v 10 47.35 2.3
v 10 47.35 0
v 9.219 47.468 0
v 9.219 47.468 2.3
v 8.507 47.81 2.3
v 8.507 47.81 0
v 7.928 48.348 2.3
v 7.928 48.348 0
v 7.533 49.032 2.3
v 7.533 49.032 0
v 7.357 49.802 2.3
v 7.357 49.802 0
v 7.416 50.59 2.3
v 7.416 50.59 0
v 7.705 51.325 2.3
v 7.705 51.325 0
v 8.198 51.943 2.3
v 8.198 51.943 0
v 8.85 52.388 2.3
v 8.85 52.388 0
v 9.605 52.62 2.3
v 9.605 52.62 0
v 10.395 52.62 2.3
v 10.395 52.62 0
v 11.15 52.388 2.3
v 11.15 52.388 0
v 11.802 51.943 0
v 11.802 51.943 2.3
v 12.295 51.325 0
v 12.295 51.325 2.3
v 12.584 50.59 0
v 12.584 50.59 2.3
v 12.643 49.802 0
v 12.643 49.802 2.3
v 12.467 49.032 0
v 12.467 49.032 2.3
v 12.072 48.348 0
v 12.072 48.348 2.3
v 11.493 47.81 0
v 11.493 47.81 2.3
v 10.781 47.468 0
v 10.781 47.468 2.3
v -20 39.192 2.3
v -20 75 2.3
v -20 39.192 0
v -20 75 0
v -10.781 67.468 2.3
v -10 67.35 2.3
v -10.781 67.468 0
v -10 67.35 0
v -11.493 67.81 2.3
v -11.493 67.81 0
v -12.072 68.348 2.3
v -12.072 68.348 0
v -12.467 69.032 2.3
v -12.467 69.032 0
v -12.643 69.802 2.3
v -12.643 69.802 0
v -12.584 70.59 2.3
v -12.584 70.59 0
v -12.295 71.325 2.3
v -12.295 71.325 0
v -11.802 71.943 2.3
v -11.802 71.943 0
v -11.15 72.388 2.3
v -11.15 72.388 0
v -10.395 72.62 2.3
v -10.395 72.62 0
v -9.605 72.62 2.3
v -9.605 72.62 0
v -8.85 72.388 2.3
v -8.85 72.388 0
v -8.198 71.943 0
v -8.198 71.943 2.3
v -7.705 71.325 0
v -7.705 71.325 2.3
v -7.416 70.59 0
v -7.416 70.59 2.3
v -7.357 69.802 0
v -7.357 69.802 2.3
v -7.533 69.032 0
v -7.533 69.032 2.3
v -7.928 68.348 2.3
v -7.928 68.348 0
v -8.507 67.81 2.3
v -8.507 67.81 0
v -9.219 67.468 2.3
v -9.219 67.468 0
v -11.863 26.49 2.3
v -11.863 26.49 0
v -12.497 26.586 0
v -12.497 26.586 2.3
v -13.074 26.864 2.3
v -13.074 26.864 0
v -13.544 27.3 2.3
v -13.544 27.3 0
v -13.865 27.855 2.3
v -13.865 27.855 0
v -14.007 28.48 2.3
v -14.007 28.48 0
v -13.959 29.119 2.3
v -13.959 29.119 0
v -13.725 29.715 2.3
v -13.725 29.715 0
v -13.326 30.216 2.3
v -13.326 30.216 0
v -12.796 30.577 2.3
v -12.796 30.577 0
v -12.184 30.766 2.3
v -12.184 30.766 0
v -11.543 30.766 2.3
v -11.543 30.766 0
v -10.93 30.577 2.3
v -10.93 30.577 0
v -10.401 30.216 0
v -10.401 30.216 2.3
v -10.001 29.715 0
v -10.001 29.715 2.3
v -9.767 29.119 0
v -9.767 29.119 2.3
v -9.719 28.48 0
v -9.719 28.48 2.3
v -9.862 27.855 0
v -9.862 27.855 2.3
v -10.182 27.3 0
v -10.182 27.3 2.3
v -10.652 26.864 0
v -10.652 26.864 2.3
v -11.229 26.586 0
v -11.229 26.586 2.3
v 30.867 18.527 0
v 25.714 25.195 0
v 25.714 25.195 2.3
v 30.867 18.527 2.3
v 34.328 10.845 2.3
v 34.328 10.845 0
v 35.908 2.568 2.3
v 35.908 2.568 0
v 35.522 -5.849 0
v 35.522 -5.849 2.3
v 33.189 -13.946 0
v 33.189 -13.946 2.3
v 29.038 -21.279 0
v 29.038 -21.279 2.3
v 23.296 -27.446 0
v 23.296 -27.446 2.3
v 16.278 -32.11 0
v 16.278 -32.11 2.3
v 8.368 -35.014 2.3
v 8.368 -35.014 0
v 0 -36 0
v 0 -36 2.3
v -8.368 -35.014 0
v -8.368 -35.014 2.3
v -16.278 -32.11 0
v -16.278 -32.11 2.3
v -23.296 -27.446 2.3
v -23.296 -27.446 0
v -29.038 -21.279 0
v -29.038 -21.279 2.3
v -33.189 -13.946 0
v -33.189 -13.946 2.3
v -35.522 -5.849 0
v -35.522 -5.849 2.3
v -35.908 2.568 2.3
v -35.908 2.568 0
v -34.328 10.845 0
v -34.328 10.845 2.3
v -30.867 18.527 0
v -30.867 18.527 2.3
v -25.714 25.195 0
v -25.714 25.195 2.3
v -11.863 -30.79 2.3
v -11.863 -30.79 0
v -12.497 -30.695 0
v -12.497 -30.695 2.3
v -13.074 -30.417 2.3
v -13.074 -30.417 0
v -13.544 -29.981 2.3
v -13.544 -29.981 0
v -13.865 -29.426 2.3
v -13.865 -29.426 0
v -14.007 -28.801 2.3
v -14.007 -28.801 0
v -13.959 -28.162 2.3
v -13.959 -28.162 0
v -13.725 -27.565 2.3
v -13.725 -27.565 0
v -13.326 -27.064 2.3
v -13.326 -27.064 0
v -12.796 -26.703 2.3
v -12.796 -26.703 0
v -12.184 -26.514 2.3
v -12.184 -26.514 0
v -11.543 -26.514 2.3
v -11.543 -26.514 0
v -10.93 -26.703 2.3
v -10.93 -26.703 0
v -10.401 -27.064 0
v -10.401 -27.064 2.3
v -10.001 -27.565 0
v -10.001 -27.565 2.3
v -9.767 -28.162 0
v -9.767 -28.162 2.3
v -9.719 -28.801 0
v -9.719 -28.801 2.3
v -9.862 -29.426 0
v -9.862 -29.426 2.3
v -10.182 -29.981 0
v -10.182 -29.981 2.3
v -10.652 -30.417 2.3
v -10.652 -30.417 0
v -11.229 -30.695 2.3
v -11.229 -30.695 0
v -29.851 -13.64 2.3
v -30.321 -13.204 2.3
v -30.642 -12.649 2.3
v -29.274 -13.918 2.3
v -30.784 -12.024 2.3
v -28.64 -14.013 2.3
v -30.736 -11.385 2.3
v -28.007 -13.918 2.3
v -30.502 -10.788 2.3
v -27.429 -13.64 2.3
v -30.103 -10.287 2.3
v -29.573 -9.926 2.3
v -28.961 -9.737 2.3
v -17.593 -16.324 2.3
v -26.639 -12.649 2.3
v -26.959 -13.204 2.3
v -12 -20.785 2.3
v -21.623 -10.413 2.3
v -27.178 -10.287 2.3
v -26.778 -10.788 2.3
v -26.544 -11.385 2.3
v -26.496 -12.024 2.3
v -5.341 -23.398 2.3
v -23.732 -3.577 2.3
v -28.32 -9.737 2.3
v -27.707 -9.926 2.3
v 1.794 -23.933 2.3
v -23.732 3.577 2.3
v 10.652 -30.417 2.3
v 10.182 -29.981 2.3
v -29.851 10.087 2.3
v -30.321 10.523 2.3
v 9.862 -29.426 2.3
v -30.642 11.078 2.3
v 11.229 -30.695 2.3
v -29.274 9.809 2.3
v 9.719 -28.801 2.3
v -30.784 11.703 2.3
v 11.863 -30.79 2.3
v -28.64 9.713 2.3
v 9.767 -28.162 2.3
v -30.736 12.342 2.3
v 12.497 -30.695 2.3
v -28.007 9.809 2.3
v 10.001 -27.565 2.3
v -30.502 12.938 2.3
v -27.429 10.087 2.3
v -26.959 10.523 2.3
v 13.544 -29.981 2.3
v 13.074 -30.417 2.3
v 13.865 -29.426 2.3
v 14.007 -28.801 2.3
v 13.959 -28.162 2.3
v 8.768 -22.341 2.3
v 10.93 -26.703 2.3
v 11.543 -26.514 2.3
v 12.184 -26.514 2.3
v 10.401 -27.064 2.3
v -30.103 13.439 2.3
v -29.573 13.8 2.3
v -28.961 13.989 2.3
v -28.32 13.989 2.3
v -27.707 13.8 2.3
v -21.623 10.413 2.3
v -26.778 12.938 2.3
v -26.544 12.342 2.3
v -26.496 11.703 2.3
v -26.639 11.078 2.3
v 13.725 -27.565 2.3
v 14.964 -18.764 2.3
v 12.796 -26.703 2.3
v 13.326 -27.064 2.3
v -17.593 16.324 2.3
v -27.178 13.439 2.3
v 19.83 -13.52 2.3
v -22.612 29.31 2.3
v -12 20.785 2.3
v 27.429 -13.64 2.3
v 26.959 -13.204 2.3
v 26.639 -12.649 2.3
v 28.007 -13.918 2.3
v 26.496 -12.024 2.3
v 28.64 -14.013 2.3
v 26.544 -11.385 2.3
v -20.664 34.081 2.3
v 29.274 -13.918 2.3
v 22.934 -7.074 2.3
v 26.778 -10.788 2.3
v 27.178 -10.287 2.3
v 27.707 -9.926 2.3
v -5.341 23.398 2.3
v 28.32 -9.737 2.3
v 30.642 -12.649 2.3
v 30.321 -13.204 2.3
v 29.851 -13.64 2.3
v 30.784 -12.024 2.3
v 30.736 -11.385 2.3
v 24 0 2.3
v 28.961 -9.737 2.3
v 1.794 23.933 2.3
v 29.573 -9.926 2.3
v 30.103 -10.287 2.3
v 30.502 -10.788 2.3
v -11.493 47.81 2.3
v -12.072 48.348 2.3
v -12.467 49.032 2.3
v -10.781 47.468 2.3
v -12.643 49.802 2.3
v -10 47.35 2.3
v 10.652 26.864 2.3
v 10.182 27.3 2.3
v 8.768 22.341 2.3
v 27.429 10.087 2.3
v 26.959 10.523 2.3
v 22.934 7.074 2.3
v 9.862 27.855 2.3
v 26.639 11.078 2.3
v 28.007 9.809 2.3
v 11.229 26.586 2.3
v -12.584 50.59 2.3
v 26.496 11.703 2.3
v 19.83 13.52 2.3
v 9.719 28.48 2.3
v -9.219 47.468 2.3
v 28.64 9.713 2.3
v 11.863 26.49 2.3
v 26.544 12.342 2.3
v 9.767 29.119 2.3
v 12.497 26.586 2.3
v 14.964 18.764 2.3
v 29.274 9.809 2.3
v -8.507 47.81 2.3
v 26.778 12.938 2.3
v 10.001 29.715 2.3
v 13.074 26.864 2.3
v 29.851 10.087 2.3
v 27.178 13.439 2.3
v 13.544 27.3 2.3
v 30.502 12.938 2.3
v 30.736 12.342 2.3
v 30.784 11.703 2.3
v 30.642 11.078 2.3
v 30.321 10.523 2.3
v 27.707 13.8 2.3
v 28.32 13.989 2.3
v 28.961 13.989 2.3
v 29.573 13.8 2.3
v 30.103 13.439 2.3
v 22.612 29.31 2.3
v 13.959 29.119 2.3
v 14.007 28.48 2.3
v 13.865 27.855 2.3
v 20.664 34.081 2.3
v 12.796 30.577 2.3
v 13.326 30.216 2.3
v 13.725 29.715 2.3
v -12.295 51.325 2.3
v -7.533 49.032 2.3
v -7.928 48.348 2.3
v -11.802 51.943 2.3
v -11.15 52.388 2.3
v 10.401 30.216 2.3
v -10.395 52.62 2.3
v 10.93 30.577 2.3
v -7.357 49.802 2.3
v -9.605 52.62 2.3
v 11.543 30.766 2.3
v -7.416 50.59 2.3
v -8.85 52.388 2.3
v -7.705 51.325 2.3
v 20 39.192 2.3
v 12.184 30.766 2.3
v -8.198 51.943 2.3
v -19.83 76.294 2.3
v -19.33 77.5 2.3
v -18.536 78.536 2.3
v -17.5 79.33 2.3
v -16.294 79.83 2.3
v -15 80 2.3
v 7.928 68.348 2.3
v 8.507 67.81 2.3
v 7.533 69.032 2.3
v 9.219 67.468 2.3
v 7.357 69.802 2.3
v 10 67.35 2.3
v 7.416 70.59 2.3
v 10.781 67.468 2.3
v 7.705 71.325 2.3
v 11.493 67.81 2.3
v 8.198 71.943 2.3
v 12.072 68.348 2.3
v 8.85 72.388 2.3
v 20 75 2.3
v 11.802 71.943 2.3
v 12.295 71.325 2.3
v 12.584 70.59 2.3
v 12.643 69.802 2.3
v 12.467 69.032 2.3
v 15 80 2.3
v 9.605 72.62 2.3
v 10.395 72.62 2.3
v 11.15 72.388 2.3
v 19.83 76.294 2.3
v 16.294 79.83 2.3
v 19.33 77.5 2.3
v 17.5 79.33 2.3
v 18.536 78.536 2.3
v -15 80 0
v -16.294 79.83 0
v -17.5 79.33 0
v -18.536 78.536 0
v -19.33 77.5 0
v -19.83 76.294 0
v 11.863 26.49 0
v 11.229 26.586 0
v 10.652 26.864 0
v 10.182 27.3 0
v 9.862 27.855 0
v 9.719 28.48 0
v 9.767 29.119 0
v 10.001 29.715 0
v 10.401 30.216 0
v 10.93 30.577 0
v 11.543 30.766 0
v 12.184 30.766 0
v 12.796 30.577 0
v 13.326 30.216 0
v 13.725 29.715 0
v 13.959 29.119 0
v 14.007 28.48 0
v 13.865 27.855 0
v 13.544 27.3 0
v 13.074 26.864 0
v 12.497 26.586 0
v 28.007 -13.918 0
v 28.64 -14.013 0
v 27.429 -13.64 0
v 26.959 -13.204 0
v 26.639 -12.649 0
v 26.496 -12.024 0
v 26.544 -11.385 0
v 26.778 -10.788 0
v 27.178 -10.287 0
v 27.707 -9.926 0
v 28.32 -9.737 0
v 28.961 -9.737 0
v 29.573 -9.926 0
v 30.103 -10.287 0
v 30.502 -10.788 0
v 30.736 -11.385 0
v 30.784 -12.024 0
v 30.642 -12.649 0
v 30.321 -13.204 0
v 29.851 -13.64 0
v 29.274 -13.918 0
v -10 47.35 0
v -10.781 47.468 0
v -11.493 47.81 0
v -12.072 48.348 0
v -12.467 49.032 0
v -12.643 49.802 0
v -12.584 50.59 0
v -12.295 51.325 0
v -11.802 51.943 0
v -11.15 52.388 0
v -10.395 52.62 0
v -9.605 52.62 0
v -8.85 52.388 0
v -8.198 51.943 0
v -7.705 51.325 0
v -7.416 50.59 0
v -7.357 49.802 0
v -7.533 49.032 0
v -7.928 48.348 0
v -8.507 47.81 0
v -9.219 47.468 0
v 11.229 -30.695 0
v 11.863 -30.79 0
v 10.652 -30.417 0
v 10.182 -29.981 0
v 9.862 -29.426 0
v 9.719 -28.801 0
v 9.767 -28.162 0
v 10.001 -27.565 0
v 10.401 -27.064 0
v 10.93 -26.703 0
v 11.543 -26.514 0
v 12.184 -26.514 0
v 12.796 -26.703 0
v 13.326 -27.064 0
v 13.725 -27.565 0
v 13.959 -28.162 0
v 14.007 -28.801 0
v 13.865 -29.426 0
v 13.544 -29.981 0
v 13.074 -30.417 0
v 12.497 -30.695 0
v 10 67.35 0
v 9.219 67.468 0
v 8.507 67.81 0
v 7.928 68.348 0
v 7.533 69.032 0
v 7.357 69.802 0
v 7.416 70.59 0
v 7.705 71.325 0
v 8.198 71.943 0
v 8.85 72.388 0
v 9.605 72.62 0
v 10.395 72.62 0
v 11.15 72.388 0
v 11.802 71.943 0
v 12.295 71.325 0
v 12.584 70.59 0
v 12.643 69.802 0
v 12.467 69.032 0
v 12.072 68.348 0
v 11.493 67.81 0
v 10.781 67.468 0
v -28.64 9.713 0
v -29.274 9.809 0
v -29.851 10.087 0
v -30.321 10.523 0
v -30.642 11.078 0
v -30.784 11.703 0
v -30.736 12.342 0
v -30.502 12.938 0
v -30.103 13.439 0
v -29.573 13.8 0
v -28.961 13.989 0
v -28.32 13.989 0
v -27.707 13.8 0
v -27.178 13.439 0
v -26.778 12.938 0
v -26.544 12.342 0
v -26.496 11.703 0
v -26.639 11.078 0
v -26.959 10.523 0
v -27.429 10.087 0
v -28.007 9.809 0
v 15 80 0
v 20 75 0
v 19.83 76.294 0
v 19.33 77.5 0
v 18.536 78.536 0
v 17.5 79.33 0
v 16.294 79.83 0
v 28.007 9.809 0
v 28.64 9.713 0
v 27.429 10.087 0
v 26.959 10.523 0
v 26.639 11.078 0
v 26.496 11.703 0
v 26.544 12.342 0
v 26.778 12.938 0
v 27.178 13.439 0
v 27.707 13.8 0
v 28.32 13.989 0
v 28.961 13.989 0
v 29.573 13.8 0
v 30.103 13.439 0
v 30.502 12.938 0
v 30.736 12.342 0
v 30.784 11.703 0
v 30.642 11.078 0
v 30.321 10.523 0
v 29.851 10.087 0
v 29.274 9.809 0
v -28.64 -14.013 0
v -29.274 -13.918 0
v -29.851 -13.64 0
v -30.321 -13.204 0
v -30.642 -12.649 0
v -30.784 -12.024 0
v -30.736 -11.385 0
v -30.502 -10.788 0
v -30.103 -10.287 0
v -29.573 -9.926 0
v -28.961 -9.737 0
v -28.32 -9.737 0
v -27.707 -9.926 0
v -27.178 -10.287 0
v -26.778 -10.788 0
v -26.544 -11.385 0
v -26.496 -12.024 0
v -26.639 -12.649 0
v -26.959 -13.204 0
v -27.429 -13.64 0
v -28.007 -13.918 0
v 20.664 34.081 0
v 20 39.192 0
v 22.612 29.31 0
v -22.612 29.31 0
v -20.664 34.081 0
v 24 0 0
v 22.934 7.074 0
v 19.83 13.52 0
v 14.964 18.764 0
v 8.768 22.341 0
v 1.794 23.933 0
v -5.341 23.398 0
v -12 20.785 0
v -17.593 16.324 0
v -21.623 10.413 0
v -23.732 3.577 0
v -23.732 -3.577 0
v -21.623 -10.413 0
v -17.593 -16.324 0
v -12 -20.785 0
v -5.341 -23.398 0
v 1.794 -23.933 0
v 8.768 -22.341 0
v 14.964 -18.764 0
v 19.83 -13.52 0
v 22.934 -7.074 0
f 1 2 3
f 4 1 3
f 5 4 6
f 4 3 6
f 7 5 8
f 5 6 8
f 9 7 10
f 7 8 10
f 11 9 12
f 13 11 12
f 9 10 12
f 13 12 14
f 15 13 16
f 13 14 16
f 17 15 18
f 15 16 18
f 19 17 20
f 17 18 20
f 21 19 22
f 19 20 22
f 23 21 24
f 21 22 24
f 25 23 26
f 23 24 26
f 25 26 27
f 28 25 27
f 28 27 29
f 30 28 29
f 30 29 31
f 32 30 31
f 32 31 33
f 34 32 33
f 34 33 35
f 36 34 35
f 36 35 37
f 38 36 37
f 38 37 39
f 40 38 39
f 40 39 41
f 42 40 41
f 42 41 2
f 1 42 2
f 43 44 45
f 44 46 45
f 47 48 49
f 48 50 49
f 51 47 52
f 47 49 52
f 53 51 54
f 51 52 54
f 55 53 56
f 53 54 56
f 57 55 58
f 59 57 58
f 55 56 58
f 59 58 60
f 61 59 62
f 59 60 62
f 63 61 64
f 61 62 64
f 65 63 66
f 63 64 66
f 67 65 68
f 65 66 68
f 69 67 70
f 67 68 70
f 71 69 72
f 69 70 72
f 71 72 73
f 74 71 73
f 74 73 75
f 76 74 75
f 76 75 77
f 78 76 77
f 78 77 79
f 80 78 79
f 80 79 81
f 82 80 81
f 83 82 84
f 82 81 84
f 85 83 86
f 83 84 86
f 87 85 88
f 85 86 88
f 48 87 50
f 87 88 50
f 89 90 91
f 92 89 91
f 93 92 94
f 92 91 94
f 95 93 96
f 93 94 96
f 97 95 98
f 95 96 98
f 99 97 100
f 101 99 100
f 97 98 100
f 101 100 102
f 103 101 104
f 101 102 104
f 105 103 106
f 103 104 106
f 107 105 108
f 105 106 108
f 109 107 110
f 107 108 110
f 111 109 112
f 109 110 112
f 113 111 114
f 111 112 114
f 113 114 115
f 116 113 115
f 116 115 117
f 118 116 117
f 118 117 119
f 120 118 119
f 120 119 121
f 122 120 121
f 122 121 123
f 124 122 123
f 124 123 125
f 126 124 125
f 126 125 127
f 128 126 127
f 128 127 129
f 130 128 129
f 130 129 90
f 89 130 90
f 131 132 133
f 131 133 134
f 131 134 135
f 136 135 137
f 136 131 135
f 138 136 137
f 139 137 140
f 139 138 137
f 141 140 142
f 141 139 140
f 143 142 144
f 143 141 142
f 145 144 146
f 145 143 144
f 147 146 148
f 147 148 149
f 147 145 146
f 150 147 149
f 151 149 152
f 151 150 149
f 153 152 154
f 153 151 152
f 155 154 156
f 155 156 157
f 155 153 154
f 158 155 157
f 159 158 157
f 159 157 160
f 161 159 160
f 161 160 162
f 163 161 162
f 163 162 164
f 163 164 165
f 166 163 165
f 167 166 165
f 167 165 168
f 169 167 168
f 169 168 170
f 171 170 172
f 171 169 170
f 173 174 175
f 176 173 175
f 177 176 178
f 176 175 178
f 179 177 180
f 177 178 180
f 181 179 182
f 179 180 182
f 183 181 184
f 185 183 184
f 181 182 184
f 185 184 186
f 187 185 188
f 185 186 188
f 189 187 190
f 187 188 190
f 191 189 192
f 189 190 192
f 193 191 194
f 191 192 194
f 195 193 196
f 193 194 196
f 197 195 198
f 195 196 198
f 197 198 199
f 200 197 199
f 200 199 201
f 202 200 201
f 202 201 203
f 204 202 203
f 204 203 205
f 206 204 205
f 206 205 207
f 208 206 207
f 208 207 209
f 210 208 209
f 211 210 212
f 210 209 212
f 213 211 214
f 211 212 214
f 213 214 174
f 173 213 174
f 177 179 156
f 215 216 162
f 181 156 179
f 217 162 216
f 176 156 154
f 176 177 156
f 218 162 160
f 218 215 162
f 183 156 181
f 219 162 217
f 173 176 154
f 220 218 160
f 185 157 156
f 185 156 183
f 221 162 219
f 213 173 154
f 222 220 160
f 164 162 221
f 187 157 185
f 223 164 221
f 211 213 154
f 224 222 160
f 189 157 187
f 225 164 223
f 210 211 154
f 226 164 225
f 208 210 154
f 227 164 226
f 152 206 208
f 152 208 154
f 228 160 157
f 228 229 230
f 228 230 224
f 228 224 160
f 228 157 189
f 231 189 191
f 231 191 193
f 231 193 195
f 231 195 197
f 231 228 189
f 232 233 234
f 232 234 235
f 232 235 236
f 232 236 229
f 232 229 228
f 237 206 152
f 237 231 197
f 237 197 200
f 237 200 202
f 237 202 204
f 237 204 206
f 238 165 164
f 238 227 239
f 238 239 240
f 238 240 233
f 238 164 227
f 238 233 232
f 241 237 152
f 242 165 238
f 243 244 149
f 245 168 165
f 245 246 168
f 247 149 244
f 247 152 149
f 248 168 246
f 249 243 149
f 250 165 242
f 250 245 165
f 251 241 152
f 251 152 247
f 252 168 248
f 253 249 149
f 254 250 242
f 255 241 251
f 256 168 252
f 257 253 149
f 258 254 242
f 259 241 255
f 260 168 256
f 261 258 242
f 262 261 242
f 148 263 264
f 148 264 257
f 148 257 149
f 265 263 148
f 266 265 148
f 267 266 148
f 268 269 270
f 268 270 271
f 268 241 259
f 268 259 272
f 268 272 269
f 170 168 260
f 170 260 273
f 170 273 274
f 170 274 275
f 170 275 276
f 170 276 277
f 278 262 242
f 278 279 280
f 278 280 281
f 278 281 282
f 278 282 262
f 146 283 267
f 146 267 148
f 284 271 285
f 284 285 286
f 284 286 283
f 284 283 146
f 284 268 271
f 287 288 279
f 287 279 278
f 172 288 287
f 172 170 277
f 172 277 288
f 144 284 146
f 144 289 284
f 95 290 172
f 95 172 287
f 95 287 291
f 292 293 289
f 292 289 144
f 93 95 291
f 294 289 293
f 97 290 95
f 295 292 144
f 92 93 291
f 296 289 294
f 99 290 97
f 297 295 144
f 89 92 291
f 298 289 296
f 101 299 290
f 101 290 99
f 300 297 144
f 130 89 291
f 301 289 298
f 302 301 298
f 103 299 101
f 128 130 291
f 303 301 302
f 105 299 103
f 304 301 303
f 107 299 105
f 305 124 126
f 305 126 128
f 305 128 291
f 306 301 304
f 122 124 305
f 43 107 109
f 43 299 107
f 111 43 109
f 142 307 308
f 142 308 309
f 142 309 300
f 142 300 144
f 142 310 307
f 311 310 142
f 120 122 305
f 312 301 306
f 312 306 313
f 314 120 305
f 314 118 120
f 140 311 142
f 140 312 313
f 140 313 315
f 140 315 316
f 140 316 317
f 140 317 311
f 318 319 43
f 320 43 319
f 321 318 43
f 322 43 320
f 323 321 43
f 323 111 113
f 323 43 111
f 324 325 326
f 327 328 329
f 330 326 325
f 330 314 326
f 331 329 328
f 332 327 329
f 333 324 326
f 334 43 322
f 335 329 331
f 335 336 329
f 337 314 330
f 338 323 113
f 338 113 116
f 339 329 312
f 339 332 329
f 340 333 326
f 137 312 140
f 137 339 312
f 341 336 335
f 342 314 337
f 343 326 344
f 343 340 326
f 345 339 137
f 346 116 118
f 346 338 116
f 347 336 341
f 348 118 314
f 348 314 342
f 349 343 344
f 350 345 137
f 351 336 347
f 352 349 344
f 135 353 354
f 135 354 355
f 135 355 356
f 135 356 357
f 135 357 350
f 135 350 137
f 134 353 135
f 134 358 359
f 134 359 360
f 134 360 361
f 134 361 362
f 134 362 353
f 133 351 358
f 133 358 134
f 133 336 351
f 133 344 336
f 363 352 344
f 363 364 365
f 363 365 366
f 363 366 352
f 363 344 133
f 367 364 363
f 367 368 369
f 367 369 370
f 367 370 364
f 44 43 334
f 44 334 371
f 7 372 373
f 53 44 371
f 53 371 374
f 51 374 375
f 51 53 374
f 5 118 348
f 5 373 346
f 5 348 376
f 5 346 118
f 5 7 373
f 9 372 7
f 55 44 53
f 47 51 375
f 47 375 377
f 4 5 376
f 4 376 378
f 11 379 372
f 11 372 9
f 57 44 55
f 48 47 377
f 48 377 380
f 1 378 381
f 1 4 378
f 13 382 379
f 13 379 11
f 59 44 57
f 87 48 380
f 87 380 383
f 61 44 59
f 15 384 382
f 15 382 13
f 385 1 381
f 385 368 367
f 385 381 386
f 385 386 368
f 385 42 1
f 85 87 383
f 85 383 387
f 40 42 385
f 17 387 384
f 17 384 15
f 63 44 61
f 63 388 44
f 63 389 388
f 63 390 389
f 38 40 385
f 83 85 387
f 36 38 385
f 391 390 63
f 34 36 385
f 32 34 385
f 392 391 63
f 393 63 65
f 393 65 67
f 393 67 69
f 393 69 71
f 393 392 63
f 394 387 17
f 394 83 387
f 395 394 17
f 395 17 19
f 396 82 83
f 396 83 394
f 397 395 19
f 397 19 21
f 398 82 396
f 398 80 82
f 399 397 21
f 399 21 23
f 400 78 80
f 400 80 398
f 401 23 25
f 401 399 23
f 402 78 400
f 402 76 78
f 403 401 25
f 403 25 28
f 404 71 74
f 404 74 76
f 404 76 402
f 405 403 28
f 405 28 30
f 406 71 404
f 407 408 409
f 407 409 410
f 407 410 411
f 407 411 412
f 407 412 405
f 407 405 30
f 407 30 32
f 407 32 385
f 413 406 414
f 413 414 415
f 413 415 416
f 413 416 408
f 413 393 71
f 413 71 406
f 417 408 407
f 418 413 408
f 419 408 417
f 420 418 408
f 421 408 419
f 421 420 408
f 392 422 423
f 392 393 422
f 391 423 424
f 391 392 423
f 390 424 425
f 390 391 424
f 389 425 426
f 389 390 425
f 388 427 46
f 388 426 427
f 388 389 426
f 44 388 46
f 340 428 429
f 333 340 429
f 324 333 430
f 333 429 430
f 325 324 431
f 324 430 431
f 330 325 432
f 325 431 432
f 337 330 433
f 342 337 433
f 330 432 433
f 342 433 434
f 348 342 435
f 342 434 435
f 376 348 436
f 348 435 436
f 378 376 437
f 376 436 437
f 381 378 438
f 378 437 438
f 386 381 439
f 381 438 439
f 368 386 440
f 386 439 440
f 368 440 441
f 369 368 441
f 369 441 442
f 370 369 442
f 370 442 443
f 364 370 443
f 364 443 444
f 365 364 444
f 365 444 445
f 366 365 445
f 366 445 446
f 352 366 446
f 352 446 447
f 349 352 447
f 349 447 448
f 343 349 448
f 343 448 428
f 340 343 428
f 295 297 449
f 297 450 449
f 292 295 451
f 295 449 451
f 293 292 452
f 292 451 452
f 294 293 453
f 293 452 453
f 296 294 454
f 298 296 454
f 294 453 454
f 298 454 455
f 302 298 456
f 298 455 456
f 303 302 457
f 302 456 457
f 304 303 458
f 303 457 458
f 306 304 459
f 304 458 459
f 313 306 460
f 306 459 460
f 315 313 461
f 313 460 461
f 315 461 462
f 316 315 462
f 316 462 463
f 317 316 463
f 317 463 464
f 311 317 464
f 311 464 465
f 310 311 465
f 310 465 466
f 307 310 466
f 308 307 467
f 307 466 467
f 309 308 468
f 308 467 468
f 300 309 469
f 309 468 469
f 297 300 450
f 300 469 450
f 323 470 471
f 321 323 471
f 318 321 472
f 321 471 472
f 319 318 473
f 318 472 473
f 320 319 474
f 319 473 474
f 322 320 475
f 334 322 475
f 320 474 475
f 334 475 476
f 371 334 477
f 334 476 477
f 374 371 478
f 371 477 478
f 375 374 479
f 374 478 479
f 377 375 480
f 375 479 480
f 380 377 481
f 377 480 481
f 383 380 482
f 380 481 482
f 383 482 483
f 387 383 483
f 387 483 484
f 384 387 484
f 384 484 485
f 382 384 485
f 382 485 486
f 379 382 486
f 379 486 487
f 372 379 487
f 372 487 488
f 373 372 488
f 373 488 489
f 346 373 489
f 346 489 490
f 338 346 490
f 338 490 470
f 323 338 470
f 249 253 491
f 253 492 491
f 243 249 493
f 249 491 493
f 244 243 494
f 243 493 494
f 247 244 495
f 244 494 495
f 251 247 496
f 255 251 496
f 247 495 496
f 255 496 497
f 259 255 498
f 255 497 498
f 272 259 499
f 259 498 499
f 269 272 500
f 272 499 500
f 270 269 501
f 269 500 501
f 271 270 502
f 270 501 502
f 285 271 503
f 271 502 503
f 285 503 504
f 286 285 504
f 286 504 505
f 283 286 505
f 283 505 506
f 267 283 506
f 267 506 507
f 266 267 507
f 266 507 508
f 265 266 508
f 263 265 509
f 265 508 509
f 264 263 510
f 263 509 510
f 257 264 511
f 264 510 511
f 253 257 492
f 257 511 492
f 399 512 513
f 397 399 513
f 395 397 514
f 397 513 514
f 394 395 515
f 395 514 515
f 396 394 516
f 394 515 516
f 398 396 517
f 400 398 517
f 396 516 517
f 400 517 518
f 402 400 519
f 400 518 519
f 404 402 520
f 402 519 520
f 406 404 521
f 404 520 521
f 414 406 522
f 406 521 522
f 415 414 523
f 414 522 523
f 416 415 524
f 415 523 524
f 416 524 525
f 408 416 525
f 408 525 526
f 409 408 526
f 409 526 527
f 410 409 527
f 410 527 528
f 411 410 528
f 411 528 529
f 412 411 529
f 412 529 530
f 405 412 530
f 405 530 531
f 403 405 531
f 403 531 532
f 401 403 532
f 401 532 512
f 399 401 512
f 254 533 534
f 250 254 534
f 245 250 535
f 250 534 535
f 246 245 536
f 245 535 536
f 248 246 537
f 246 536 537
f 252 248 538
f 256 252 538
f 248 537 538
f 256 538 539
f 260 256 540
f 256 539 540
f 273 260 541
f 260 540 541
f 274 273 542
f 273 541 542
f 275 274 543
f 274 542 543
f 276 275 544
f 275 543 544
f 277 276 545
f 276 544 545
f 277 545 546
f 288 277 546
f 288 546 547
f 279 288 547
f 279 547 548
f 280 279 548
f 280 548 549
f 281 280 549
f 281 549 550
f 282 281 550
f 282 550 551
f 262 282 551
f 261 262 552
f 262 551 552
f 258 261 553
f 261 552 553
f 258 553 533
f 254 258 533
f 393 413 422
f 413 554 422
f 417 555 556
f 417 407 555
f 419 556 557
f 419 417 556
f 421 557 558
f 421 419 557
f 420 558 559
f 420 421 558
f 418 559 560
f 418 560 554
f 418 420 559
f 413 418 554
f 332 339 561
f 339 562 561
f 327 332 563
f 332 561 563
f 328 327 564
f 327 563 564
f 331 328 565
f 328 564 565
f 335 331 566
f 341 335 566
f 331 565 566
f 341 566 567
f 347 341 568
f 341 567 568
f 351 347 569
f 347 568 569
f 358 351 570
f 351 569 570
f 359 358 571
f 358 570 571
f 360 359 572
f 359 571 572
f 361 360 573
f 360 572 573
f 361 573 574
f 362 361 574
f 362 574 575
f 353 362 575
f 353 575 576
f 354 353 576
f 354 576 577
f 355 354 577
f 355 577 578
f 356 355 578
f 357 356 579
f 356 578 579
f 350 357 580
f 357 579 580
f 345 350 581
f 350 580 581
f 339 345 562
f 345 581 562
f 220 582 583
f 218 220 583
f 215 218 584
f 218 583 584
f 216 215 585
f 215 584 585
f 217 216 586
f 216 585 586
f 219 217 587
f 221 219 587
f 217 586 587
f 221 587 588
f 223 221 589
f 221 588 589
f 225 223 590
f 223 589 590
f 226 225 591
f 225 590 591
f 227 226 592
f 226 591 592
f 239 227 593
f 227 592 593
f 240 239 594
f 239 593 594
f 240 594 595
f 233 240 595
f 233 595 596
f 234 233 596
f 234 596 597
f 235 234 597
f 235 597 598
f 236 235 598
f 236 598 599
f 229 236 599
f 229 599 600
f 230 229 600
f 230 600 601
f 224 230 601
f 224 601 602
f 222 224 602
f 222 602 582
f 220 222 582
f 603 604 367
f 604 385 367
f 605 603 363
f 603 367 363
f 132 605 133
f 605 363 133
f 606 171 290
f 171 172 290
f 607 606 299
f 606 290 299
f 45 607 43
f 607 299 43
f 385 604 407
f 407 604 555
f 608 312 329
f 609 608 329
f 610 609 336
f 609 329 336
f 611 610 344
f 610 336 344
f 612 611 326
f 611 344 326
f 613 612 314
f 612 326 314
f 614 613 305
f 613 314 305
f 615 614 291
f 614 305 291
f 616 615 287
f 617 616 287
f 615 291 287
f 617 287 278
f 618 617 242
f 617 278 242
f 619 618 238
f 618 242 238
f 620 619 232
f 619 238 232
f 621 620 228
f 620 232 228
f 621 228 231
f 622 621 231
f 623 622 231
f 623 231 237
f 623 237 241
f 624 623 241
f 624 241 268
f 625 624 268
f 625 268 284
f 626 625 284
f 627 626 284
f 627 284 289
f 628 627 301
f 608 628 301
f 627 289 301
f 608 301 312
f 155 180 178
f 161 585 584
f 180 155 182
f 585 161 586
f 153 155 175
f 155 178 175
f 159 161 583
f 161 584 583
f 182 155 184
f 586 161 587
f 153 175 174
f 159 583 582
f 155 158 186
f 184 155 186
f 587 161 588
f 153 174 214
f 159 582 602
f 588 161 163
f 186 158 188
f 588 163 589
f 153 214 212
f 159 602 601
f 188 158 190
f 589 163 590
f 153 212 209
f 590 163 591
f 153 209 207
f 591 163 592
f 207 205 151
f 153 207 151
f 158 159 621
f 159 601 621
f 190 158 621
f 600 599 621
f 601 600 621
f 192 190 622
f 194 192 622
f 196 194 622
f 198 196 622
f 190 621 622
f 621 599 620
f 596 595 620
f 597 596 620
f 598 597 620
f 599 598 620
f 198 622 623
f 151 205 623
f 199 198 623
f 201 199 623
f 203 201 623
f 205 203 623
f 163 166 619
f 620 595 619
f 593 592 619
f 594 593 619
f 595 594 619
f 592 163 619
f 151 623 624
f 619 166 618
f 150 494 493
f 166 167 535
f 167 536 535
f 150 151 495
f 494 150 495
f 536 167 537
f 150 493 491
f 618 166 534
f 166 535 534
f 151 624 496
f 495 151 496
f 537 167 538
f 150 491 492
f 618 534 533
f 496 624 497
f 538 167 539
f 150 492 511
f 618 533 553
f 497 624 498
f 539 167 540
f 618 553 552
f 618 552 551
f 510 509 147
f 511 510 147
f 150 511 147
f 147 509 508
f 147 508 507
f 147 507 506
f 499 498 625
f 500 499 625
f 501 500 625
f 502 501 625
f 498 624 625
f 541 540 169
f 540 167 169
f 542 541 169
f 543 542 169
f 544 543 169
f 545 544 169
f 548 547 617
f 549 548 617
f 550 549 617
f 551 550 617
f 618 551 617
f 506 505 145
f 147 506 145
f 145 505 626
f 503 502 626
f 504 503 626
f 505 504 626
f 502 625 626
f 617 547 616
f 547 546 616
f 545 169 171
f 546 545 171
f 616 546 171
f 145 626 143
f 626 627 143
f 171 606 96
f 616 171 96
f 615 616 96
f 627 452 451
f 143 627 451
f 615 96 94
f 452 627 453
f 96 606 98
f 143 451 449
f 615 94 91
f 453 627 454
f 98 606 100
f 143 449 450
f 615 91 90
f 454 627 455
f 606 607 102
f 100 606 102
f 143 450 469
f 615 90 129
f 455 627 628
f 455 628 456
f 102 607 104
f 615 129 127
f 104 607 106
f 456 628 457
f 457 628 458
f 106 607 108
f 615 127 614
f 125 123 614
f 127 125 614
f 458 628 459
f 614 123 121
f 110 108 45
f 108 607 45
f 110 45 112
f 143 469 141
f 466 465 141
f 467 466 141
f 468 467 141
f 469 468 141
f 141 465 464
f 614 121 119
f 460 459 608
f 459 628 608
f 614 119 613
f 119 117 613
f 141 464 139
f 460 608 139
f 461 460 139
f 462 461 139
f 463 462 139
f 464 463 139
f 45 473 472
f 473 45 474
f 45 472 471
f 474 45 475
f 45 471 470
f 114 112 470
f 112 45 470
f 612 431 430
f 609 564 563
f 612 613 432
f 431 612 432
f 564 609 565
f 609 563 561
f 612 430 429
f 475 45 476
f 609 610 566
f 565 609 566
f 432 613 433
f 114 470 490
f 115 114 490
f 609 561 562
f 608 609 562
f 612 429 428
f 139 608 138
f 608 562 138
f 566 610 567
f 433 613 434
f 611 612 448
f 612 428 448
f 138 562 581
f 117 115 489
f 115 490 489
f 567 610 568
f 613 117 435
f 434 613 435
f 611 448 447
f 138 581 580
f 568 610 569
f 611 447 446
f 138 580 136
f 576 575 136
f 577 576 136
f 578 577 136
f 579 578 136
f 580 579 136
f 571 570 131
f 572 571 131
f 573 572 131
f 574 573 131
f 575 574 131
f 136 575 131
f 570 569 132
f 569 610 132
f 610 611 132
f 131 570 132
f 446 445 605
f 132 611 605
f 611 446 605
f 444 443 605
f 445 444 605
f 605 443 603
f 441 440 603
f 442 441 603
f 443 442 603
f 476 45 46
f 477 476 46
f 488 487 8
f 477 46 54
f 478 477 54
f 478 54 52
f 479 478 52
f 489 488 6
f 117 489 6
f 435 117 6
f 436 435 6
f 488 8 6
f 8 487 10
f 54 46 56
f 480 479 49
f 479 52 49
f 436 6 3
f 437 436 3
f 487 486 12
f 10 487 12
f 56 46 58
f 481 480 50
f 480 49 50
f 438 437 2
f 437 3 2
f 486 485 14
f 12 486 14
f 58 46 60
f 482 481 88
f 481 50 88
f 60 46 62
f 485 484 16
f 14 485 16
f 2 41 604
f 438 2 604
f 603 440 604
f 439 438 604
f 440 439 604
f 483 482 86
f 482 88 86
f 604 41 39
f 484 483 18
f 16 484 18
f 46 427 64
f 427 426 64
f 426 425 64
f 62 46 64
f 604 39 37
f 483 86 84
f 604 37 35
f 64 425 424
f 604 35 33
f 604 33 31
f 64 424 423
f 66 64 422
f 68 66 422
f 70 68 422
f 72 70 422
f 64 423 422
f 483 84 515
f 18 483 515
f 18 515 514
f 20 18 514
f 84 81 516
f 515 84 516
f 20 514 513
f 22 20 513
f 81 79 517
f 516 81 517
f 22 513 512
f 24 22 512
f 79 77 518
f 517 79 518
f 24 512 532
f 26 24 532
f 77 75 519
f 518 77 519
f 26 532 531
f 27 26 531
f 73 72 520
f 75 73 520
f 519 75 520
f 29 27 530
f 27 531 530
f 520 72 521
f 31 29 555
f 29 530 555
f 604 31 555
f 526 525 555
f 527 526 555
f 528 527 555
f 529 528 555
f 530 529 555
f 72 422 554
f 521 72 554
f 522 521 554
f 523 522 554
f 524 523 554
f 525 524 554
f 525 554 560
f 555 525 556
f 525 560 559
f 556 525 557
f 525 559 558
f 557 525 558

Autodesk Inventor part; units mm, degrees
ref_plane "YZ Plane" through (0, 0, 0) normal (1, 0, 0) x (0, 1, 0)
ref_plane "XZ Plane" through (0, 0, 0) normal (0, 1, 0) x (-1, 0, 0)
ref_plane "XY Plane" through (0, 0, 0) normal (0, 0, 1) x (1, 0, 0)
sketch "スケッチ1" plane through (0, 0, 0) normal (0, 0, 1) x (1, 0, 0)
  arc A0 (-20, 29.9333) -> (20, 29.9333) centre (0, 0) ccw
  line L0 (-20, -80) -> (20, -80)
  line L1 (20, -80) -> (20, 80)
  line L2 (20, 80) -> (-20, 80)
  line L3 (-20, 80) -> (-20, -80)
  line L4 (-20, -80) -> (20, 80) construction
  line L5 (20, -80) -> (-20, 80) construction
  dimension "d0" = 72
  dimension "d1" = 80
  dimension "d2" = 40
extrude "プレート1" add sketch "スケッチ1" along normal blind 2.3 contours L3 A0 | L3 L2 L1 A0 | L1 A0
sketch "スケッチ2" plane through (0, 0, 2.3) normal (0, 0, 1) x (1, 0, 0)
  circle A0 centre (0, 0) radius 31
  point P0 (-28.6403, -11.8632)
  point P1 (-11.8632, -28.6403)
  point P2 (11.8632, -28.6403)
  point P3 (28.6403, -11.8632)
  point P4 (28.6403, 11.8632)
  point P5 (11.8632, 28.6403)
  point P6 (-11.8632, 28.6403)
  point P7 (-28.6403, 11.8632)
  dimension "d5" = 62
  dimension "d8" = 360
  dimension "d34" = 0
hole "穴1" at (-28.6403, 11.8632, 2.3) at (-11.8632, 28.6403, 2.3) at (11.8632, 28.6403, 2.3) at (28.6403, 11.8632, 2.3) at (28.6403, -11.8632, 2.3) at (11.8632, -28.6403, 2.3) at (-11.8632, -28.6403, 2.3) at (-28.6403, -11.8632, 2.3) direction (0, 0, -1) diameter 4.3 end through all clearance for "Socket Head Cap Screw" size "M4" standard "Ansi Metric M Profile"
sketch "スケッチ4" plane through (0, 0, 2.3) normal (0, 0, 1) x (1, 0, 0)
  line L0 (10, 50) -> (-10, 50)
  line L1 (-10, 50) -> (-10, 70)
  line L2 (-10, 70) -> (10, 70)
  line L3 (10, 70) -> (10, 50)
  line L4 (10, 50) -> (-10, 70) construction
  line L5 (-10, 50) -> (10, 70) construction
  line L6 (-20, 80) -> (20, 80) projected
  circle A0 centre (0, 0) radius 72.5
  point P0 (0, 60)
  point P1 (0, 60)
  dimension "d21" = 20
  dimension "d22" = 10
  dimension "d33" = 145
  dimension "d38" = 20
hole "穴2" at (-10, 70, 2.3) at (10, 70, 2.3) at (-10, 50, 2.3) at (10, 50, 2.3) direction (0, 0, -1) diameter 5.3 end through all clearance for "Socket Head Cap Screw" size "M5" standard "Ansi Metric M Profile"
fillet "コーナーR2" radius 5 2 edges at (-20, 80, 1.15) (20, 80, 1.15)
sketch "スケッチ5" plane through (0, 0, 2.3) normal (0, 0, 1) x (1, 0, 0)
  circle A0 centre (0, 0) radius 24
  dimension "d35" = 48
extrude "押し出し2" cut sketch "スケッチ5" against normal blind 10
fillet "コーナーR3" radius 20 2 edges at (20, 29.9333, 1.15) (-20, 29.9333, 1.15)
equation "\"d16\" = Thickness"
equation "\"d3\" = Thickness"
equation "\"BendRadius\" = Thickness"
equation "\"BendReliefWidth\" = Thickness"
equation "\"BendReliefDepth\" = 0.5 * Thickness"
equation "\"CornerReliefSize\" = 4 * Thickness"
equation "\"MinimumRemnant\" = 2 * Thickness"
equation "\"TransitionRadius\" = BendRadius"
equation "\"JacobiRadiusSize\" = BendRadius"
equation "\"GapSize\" = Thickness"
equation "\"Thickness\" = 2.3"
properties part number "scara-plate8" material "鋼、炭素鋼"
